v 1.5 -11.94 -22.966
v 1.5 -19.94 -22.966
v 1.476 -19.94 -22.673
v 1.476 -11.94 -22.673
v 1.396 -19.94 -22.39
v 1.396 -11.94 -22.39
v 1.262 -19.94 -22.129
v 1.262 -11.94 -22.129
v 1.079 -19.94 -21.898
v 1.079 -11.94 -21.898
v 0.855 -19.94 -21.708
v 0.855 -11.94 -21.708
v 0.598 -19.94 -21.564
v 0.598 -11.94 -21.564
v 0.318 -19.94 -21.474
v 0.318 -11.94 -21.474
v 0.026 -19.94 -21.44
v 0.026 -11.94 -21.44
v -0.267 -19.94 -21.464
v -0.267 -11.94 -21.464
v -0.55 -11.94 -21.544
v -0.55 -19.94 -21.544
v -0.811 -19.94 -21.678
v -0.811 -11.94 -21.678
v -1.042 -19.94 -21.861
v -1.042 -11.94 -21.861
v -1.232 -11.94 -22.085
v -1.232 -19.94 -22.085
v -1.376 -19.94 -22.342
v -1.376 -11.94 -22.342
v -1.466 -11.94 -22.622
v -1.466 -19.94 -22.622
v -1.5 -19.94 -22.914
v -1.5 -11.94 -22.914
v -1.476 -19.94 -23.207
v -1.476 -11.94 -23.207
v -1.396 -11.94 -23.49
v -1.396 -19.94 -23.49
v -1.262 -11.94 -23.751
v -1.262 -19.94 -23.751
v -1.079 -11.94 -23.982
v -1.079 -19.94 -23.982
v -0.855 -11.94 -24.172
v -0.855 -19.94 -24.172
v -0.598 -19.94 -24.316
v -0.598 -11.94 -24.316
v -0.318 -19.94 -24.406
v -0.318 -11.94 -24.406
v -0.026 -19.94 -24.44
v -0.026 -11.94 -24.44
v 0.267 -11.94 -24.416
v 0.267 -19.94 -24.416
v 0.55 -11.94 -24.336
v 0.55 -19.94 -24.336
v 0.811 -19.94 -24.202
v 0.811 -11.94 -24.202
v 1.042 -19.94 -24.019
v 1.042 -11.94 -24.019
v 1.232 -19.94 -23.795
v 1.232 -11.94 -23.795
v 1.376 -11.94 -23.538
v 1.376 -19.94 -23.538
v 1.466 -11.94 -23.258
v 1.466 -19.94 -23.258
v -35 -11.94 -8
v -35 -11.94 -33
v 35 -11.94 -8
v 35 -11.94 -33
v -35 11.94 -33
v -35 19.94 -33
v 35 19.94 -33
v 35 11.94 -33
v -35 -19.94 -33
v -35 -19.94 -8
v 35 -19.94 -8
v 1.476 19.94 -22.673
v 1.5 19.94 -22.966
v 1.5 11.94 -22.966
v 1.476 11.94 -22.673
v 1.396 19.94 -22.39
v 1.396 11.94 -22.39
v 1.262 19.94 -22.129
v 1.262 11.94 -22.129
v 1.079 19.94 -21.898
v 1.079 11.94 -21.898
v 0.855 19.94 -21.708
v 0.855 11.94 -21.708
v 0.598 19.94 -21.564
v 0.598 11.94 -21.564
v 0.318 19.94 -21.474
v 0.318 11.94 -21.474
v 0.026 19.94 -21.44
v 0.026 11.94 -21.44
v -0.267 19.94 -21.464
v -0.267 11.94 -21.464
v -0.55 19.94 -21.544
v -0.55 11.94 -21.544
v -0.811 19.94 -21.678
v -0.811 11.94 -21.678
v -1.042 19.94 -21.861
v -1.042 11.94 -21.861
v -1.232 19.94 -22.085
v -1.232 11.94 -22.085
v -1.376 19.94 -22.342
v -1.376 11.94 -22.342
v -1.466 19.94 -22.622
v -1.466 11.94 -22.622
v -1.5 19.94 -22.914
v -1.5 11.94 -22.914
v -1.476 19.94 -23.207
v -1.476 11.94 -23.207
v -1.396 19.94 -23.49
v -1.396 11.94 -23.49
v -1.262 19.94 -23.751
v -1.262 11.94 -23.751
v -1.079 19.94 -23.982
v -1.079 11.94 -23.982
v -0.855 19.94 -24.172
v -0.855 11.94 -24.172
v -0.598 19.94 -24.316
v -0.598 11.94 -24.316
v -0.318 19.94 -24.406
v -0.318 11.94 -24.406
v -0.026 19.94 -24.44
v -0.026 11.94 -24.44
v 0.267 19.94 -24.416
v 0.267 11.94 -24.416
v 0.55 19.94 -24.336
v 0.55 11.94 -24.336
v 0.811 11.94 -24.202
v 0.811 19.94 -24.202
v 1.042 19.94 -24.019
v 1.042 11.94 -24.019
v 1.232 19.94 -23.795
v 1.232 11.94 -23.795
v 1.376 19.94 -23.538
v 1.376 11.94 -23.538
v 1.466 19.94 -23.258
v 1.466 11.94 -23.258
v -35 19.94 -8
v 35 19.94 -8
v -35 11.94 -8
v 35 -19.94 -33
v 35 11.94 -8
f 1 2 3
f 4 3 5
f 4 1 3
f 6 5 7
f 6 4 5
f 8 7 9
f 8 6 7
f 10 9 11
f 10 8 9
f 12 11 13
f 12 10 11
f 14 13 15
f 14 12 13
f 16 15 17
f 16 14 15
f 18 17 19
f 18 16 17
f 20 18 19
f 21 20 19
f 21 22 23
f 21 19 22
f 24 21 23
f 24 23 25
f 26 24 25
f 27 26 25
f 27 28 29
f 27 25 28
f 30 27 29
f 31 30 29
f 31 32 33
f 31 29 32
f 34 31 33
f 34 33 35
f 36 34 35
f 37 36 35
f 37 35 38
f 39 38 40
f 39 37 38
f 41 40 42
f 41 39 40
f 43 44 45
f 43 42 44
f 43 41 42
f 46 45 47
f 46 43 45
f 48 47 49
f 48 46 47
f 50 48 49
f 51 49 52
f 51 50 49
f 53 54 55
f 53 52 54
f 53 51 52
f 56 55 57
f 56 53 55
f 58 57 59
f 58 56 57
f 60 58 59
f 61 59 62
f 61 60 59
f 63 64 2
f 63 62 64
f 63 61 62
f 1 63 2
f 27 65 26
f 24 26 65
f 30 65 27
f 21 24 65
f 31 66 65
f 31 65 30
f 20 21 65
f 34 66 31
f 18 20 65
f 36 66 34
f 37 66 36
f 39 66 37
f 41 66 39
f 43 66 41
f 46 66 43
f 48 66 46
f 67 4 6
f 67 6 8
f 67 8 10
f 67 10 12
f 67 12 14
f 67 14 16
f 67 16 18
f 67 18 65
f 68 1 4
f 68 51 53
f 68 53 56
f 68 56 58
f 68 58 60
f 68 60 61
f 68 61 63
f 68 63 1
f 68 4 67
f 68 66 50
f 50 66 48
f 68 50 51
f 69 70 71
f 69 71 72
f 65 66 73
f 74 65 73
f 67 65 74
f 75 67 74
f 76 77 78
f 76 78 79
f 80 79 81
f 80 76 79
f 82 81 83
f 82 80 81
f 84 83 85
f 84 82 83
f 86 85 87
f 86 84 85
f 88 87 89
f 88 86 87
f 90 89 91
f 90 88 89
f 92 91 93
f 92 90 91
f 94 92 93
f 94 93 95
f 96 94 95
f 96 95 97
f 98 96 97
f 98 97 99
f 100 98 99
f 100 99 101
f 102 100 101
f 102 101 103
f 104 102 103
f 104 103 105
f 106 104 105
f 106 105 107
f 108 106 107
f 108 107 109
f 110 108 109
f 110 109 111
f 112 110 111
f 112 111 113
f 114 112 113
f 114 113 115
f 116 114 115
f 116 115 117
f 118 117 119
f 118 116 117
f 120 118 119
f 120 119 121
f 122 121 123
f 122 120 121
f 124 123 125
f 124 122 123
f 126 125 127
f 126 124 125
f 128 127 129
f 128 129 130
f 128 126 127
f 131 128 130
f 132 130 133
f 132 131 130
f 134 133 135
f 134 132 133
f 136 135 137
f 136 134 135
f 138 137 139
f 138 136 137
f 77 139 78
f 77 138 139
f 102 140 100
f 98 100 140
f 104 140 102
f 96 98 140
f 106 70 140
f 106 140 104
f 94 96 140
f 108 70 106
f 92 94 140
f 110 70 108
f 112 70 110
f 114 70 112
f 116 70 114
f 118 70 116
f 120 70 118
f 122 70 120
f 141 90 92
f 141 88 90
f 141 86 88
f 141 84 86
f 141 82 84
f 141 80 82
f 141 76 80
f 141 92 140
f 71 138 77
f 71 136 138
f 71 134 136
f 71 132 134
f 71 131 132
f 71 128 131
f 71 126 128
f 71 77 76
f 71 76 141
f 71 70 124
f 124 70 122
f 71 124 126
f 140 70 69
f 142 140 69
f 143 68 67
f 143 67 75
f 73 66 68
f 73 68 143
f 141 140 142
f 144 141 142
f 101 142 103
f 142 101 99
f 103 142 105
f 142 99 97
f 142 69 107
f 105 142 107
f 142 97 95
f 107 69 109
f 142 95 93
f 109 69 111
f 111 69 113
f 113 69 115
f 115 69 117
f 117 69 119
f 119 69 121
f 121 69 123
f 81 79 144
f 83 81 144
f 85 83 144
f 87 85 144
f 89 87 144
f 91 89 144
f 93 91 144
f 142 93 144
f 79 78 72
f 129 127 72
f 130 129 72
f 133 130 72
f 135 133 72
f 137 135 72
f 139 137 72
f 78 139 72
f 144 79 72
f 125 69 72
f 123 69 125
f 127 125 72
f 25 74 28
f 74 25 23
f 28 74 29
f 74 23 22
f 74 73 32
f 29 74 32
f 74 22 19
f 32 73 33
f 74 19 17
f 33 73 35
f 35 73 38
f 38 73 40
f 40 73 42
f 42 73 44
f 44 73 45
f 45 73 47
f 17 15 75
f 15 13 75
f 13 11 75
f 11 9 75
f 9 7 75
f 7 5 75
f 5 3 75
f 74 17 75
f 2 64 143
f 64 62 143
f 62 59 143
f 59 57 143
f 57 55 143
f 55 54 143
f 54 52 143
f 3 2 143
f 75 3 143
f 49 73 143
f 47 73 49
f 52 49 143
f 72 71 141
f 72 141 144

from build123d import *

# Parameters (mm, degrees)
TORUS001_R               = 1.5
TORUS001_ANGLE           = 90
TORUS001_PITCH_ANGLE     = 90
TORUS001_PLACEMENT_ANGLE = -180
TORUS_R                  = 1.5
TORUS_ANGLE              = 90
TORUS_PITCH_ANGLE        = 90
CYLINDER021_R            = 1.5
CYLINDER021_DEPTH        = 20
CYLINDER021_ROLL_ANGLE   = 90
CYLINDER021_PITCH_ANGLE  = 1
CYLINDER020_R            = 1.5
CYLINDER020_DEPTH        = 20
CYLINDER020_ROLL_ANGLE   = 90
CYLINDER020_PITCH_ANGLE  = 1
BOX001_W                 = 0.7
BOX001_H                 = 0.4
BOX001_DEPTH             = 10
CYLINDER004_R            = 0.65
CYLINDER004_DEPTH        = 10
CYLINDER002_R            = 1.5
CYLINDER002_DEPTH        = 79
BOX002_W                 = 0.7
BOX002_H                 = 0.4
BOX002_DEPTH             = 10
CYLINDER003_R            = 0.65
CYLINDER003_DEPTH        = 10
CYLINDER001_R            = 1.5
CYLINDER001_DEPTH        = 79
BOX011_W                 = 8
BOX011_H                 = 70
BOX011_DEPTH             = 25
BOX011_PLACEMENT_ANGLE   = -90
BOX010_W                 = 8
BOX010_H                 = 70
BOX010_DEPTH             = 25
BOX010_PLACEMENT_ANGLE   = -90


with BuildPart() as f_316_bent002:
    # Torus001 → Torus001 (revolve)
    with BuildSketch(Plane.XZ):
        with Locations((7.94, 0)):
            Circle(TORUS001_R)
    revolve(axis=Axis((0, 0, 0), (0, 0, 1)), revolution_arc=TORUS001_ANGLE)


with BuildPart() as f_316_bent002_1:
    # Torus001 pitch: moved
    add(f_316_bent002.part.rotate(Axis((0, 0, 0), (0, 1, 0)), TORUS001_PITCH_ANGLE))


with BuildPart() as f_316_bent002_2:
    # Torus001 placement: moved
    add(f_316_bent002_1.part.moved(Location((0, 11.94, -15))).rotate(Axis((0, 11.94, -15), (0, 0, 1)), TORUS001_PLACEMENT_ANGLE))


with BuildPart() as f_316_bent:
    # Torus → Torus (revolve)
    with BuildSketch(Plane.XZ):
        with Locations((7.94, 0)):
            Circle(TORUS_R)
    revolve(axis=Axis((0, 0, 0), (0, 0, 1)), revolution_arc=TORUS_ANGLE)


with BuildPart() as f_316_bent_1:
    # Torus pitch: moved
    add(f_316_bent.part.rotate(Axis((0, 0, 0), (0, 1, 0)), TORUS_PITCH_ANGLE))


with BuildPart() as f_316_bent_2:
    # Torus placement: moved
    add(f_316_bent_1.part.moved(Location((0, -11.94, -15))))

    # Fusion027: union 316-Bent002
    add(f_316_bent002_2.part)


with BuildPart() as f_316_terminal002:
    # Cylinder021 → Cylinder021 (new body)
    with BuildSketch(Plane.XY):
        Circle(CYLINDER021_R)
    extrude(amount=CYLINDER021_DEPTH)


with BuildPart() as f_316_terminal002_1:
    # Cylinder021 roll: moved
    add(f_316_terminal002.part.rotate(Axis((0, 0, 0), (1, 0, 0)), CYLINDER021_ROLL_ANGLE))


with BuildPart() as f_316_terminal002_2:
    # Cylinder021 pitch: moved
    add(f_316_terminal002_1.part.rotate(Axis((0, 0, 0), (0, 1, 0)), CYLINDER021_PITCH_ANGLE))


with BuildPart() as f_316_terminal002_3:
    # Cylinder021 placement: moved
    add(f_316_terminal002_2.part.moved(Location((0, 31.94, -22.94))))


with BuildPart() as f_316_bottom:
    # Cylinder020 → Cylinder020 (new body)
    with BuildSketch(Plane.XY):
        Circle(CYLINDER020_R)
    extrude(amount=CYLINDER020_DEPTH)


with BuildPart() as f_316_bottom_1:
    # Cylinder020 roll: moved
    add(f_316_bottom.part.rotate(Axis((0, 0, 0), (1, 0, 0)), CYLINDER020_ROLL_ANGLE))


with BuildPart() as f_316_bottom_2:
    # Cylinder020 pitch: moved
    add(f_316_bottom_1.part.rotate(Axis((0, 0, 0), (0, 1, 0)), CYLINDER020_PITCH_ANGLE))


with BuildPart() as f_316_bottom_3:
    # Cylinder020 placement: moved
    add(f_316_bottom_2.part.moved(Location((0, -11.94, -22.94))))

    # Fusion026: union 316-Terminal002
    add(f_316_terminal002_3.part)

    # Fusion028: union 316-Bent
    add(f_316_bent_2.part)


with BuildPart() as cube:
    # Box001 → Box001 (new body)
    with BuildSketch(Plane(origin=(-0.35, 2.5, 48), x_dir=(1, 0, 0), z_dir=(0, 0, 1))):
        with Locations((0.35, 0.2)):
            Rectangle(BOX001_W, BOX001_H)
    extrude(amount=BOX001_DEPTH)


with BuildPart() as fusion003:
    # Cylinder004 → Cylinder004 (new body)
    with BuildSketch(Plane(origin=(0, 3.3, 48), x_dir=(1, 0, 0), z_dir=(0, 0, 1))):
        Circle(CYLINDER004_R)
    extrude(amount=CYLINDER004_DEPTH)

    # Fusion003: union Cube
    add(cube.part)


with BuildPart() as f_316_grooved002:
    # Cylinder002 → Cylinder002 (new body)
    with BuildSketch(Plane(origin=(0, 4, -21), x_dir=(1, 0, 0), z_dir=(0, 0, 1))):
        Circle(CYLINDER002_R)
    extrude(amount=CYLINDER002_DEPTH)

    # Cut012: cut Fusion003
    add(fusion003.part, mode=Mode.SUBTRACT)


with BuildPart() as cube001:
    # Box002 → Box002 (new body)
    with BuildSketch(Plane(origin=(-0.35, -2.9, 48), x_dir=(1, 0, 0), z_dir=(0, 0, 1))):
        with Locations((0.35, 0.2)):
            Rectangle(BOX002_W, BOX002_H)
    extrude(amount=BOX002_DEPTH)


with BuildPart() as fusion004:
    # Cylinder003 → Cylinder003 (new body)
    with BuildSketch(Plane(origin=(0, -3.3, 48), x_dir=(1, 0, 0), z_dir=(0, 0, 1))):
        Circle(CYLINDER003_R)
    extrude(amount=CYLINDER003_DEPTH)

    # Fusion004: union Cube001
    add(cube001.part)


with BuildPart() as fusion029:
    # Cylinder001 → Cylinder001 (new body)
    with BuildSketch(Plane(origin=(0, -4, -21), x_dir=(1, 0, 0), z_dir=(0, 0, 1))):
        Circle(CYLINDER001_R)
    extrude(amount=CYLINDER001_DEPTH)

    # Cut011: cut Fusion004
    add(fusion004.part, mode=Mode.SUBTRACT)

    # Fusion025: union 316-Grooved002
    add(f_316_grooved002.part)


with BuildPart() as fusion029_1:
    # Fusion025 placement: moved
    add(fusion029.part.moved(Location((0, 0, 6))))

    # Fusion029: union 316-Bottom
    add(f_316_bottom_3.part)


with BuildPart() as wood004:
    # Box011 → Box011 (new body)
    with BuildSketch(Plane.XY):
        with Locations((4, 35)):
            Rectangle(BOX011_W, BOX011_H)
    extrude(amount=BOX011_DEPTH)


with BuildPart() as wood004_1:
    # Box011 placement: moved
    add(wood004.part.moved(Location((-35, 19.94, -33))).rotate(Axis((-35, 19.94, -33), (0, 0, 1)), BOX011_PLACEMENT_ANGLE))


with BuildPart() as wood_down002:
    # Box010 → Box010 (new body)
    with BuildSketch(Plane.XY):
        with Locations((4, 35)):
            Rectangle(BOX010_W, BOX010_H)
    extrude(amount=BOX010_DEPTH)


with BuildPart() as wood_down002_1:
    # Box010 placement: moved
    add(wood_down002.part.moved(Location((-35, -11.94, -33))).rotate(Axis((-35, -11.94, -33), (0, 0, 1)), BOX010_PLACEMENT_ANGLE))

    # Fusion031: union Wood004
    add(wood004_1.part)

    # Cut020: cut Fusion029
    add(fusion029_1.part, mode=Mode.SUBTRACT)


solid = wood_down002_1.part
